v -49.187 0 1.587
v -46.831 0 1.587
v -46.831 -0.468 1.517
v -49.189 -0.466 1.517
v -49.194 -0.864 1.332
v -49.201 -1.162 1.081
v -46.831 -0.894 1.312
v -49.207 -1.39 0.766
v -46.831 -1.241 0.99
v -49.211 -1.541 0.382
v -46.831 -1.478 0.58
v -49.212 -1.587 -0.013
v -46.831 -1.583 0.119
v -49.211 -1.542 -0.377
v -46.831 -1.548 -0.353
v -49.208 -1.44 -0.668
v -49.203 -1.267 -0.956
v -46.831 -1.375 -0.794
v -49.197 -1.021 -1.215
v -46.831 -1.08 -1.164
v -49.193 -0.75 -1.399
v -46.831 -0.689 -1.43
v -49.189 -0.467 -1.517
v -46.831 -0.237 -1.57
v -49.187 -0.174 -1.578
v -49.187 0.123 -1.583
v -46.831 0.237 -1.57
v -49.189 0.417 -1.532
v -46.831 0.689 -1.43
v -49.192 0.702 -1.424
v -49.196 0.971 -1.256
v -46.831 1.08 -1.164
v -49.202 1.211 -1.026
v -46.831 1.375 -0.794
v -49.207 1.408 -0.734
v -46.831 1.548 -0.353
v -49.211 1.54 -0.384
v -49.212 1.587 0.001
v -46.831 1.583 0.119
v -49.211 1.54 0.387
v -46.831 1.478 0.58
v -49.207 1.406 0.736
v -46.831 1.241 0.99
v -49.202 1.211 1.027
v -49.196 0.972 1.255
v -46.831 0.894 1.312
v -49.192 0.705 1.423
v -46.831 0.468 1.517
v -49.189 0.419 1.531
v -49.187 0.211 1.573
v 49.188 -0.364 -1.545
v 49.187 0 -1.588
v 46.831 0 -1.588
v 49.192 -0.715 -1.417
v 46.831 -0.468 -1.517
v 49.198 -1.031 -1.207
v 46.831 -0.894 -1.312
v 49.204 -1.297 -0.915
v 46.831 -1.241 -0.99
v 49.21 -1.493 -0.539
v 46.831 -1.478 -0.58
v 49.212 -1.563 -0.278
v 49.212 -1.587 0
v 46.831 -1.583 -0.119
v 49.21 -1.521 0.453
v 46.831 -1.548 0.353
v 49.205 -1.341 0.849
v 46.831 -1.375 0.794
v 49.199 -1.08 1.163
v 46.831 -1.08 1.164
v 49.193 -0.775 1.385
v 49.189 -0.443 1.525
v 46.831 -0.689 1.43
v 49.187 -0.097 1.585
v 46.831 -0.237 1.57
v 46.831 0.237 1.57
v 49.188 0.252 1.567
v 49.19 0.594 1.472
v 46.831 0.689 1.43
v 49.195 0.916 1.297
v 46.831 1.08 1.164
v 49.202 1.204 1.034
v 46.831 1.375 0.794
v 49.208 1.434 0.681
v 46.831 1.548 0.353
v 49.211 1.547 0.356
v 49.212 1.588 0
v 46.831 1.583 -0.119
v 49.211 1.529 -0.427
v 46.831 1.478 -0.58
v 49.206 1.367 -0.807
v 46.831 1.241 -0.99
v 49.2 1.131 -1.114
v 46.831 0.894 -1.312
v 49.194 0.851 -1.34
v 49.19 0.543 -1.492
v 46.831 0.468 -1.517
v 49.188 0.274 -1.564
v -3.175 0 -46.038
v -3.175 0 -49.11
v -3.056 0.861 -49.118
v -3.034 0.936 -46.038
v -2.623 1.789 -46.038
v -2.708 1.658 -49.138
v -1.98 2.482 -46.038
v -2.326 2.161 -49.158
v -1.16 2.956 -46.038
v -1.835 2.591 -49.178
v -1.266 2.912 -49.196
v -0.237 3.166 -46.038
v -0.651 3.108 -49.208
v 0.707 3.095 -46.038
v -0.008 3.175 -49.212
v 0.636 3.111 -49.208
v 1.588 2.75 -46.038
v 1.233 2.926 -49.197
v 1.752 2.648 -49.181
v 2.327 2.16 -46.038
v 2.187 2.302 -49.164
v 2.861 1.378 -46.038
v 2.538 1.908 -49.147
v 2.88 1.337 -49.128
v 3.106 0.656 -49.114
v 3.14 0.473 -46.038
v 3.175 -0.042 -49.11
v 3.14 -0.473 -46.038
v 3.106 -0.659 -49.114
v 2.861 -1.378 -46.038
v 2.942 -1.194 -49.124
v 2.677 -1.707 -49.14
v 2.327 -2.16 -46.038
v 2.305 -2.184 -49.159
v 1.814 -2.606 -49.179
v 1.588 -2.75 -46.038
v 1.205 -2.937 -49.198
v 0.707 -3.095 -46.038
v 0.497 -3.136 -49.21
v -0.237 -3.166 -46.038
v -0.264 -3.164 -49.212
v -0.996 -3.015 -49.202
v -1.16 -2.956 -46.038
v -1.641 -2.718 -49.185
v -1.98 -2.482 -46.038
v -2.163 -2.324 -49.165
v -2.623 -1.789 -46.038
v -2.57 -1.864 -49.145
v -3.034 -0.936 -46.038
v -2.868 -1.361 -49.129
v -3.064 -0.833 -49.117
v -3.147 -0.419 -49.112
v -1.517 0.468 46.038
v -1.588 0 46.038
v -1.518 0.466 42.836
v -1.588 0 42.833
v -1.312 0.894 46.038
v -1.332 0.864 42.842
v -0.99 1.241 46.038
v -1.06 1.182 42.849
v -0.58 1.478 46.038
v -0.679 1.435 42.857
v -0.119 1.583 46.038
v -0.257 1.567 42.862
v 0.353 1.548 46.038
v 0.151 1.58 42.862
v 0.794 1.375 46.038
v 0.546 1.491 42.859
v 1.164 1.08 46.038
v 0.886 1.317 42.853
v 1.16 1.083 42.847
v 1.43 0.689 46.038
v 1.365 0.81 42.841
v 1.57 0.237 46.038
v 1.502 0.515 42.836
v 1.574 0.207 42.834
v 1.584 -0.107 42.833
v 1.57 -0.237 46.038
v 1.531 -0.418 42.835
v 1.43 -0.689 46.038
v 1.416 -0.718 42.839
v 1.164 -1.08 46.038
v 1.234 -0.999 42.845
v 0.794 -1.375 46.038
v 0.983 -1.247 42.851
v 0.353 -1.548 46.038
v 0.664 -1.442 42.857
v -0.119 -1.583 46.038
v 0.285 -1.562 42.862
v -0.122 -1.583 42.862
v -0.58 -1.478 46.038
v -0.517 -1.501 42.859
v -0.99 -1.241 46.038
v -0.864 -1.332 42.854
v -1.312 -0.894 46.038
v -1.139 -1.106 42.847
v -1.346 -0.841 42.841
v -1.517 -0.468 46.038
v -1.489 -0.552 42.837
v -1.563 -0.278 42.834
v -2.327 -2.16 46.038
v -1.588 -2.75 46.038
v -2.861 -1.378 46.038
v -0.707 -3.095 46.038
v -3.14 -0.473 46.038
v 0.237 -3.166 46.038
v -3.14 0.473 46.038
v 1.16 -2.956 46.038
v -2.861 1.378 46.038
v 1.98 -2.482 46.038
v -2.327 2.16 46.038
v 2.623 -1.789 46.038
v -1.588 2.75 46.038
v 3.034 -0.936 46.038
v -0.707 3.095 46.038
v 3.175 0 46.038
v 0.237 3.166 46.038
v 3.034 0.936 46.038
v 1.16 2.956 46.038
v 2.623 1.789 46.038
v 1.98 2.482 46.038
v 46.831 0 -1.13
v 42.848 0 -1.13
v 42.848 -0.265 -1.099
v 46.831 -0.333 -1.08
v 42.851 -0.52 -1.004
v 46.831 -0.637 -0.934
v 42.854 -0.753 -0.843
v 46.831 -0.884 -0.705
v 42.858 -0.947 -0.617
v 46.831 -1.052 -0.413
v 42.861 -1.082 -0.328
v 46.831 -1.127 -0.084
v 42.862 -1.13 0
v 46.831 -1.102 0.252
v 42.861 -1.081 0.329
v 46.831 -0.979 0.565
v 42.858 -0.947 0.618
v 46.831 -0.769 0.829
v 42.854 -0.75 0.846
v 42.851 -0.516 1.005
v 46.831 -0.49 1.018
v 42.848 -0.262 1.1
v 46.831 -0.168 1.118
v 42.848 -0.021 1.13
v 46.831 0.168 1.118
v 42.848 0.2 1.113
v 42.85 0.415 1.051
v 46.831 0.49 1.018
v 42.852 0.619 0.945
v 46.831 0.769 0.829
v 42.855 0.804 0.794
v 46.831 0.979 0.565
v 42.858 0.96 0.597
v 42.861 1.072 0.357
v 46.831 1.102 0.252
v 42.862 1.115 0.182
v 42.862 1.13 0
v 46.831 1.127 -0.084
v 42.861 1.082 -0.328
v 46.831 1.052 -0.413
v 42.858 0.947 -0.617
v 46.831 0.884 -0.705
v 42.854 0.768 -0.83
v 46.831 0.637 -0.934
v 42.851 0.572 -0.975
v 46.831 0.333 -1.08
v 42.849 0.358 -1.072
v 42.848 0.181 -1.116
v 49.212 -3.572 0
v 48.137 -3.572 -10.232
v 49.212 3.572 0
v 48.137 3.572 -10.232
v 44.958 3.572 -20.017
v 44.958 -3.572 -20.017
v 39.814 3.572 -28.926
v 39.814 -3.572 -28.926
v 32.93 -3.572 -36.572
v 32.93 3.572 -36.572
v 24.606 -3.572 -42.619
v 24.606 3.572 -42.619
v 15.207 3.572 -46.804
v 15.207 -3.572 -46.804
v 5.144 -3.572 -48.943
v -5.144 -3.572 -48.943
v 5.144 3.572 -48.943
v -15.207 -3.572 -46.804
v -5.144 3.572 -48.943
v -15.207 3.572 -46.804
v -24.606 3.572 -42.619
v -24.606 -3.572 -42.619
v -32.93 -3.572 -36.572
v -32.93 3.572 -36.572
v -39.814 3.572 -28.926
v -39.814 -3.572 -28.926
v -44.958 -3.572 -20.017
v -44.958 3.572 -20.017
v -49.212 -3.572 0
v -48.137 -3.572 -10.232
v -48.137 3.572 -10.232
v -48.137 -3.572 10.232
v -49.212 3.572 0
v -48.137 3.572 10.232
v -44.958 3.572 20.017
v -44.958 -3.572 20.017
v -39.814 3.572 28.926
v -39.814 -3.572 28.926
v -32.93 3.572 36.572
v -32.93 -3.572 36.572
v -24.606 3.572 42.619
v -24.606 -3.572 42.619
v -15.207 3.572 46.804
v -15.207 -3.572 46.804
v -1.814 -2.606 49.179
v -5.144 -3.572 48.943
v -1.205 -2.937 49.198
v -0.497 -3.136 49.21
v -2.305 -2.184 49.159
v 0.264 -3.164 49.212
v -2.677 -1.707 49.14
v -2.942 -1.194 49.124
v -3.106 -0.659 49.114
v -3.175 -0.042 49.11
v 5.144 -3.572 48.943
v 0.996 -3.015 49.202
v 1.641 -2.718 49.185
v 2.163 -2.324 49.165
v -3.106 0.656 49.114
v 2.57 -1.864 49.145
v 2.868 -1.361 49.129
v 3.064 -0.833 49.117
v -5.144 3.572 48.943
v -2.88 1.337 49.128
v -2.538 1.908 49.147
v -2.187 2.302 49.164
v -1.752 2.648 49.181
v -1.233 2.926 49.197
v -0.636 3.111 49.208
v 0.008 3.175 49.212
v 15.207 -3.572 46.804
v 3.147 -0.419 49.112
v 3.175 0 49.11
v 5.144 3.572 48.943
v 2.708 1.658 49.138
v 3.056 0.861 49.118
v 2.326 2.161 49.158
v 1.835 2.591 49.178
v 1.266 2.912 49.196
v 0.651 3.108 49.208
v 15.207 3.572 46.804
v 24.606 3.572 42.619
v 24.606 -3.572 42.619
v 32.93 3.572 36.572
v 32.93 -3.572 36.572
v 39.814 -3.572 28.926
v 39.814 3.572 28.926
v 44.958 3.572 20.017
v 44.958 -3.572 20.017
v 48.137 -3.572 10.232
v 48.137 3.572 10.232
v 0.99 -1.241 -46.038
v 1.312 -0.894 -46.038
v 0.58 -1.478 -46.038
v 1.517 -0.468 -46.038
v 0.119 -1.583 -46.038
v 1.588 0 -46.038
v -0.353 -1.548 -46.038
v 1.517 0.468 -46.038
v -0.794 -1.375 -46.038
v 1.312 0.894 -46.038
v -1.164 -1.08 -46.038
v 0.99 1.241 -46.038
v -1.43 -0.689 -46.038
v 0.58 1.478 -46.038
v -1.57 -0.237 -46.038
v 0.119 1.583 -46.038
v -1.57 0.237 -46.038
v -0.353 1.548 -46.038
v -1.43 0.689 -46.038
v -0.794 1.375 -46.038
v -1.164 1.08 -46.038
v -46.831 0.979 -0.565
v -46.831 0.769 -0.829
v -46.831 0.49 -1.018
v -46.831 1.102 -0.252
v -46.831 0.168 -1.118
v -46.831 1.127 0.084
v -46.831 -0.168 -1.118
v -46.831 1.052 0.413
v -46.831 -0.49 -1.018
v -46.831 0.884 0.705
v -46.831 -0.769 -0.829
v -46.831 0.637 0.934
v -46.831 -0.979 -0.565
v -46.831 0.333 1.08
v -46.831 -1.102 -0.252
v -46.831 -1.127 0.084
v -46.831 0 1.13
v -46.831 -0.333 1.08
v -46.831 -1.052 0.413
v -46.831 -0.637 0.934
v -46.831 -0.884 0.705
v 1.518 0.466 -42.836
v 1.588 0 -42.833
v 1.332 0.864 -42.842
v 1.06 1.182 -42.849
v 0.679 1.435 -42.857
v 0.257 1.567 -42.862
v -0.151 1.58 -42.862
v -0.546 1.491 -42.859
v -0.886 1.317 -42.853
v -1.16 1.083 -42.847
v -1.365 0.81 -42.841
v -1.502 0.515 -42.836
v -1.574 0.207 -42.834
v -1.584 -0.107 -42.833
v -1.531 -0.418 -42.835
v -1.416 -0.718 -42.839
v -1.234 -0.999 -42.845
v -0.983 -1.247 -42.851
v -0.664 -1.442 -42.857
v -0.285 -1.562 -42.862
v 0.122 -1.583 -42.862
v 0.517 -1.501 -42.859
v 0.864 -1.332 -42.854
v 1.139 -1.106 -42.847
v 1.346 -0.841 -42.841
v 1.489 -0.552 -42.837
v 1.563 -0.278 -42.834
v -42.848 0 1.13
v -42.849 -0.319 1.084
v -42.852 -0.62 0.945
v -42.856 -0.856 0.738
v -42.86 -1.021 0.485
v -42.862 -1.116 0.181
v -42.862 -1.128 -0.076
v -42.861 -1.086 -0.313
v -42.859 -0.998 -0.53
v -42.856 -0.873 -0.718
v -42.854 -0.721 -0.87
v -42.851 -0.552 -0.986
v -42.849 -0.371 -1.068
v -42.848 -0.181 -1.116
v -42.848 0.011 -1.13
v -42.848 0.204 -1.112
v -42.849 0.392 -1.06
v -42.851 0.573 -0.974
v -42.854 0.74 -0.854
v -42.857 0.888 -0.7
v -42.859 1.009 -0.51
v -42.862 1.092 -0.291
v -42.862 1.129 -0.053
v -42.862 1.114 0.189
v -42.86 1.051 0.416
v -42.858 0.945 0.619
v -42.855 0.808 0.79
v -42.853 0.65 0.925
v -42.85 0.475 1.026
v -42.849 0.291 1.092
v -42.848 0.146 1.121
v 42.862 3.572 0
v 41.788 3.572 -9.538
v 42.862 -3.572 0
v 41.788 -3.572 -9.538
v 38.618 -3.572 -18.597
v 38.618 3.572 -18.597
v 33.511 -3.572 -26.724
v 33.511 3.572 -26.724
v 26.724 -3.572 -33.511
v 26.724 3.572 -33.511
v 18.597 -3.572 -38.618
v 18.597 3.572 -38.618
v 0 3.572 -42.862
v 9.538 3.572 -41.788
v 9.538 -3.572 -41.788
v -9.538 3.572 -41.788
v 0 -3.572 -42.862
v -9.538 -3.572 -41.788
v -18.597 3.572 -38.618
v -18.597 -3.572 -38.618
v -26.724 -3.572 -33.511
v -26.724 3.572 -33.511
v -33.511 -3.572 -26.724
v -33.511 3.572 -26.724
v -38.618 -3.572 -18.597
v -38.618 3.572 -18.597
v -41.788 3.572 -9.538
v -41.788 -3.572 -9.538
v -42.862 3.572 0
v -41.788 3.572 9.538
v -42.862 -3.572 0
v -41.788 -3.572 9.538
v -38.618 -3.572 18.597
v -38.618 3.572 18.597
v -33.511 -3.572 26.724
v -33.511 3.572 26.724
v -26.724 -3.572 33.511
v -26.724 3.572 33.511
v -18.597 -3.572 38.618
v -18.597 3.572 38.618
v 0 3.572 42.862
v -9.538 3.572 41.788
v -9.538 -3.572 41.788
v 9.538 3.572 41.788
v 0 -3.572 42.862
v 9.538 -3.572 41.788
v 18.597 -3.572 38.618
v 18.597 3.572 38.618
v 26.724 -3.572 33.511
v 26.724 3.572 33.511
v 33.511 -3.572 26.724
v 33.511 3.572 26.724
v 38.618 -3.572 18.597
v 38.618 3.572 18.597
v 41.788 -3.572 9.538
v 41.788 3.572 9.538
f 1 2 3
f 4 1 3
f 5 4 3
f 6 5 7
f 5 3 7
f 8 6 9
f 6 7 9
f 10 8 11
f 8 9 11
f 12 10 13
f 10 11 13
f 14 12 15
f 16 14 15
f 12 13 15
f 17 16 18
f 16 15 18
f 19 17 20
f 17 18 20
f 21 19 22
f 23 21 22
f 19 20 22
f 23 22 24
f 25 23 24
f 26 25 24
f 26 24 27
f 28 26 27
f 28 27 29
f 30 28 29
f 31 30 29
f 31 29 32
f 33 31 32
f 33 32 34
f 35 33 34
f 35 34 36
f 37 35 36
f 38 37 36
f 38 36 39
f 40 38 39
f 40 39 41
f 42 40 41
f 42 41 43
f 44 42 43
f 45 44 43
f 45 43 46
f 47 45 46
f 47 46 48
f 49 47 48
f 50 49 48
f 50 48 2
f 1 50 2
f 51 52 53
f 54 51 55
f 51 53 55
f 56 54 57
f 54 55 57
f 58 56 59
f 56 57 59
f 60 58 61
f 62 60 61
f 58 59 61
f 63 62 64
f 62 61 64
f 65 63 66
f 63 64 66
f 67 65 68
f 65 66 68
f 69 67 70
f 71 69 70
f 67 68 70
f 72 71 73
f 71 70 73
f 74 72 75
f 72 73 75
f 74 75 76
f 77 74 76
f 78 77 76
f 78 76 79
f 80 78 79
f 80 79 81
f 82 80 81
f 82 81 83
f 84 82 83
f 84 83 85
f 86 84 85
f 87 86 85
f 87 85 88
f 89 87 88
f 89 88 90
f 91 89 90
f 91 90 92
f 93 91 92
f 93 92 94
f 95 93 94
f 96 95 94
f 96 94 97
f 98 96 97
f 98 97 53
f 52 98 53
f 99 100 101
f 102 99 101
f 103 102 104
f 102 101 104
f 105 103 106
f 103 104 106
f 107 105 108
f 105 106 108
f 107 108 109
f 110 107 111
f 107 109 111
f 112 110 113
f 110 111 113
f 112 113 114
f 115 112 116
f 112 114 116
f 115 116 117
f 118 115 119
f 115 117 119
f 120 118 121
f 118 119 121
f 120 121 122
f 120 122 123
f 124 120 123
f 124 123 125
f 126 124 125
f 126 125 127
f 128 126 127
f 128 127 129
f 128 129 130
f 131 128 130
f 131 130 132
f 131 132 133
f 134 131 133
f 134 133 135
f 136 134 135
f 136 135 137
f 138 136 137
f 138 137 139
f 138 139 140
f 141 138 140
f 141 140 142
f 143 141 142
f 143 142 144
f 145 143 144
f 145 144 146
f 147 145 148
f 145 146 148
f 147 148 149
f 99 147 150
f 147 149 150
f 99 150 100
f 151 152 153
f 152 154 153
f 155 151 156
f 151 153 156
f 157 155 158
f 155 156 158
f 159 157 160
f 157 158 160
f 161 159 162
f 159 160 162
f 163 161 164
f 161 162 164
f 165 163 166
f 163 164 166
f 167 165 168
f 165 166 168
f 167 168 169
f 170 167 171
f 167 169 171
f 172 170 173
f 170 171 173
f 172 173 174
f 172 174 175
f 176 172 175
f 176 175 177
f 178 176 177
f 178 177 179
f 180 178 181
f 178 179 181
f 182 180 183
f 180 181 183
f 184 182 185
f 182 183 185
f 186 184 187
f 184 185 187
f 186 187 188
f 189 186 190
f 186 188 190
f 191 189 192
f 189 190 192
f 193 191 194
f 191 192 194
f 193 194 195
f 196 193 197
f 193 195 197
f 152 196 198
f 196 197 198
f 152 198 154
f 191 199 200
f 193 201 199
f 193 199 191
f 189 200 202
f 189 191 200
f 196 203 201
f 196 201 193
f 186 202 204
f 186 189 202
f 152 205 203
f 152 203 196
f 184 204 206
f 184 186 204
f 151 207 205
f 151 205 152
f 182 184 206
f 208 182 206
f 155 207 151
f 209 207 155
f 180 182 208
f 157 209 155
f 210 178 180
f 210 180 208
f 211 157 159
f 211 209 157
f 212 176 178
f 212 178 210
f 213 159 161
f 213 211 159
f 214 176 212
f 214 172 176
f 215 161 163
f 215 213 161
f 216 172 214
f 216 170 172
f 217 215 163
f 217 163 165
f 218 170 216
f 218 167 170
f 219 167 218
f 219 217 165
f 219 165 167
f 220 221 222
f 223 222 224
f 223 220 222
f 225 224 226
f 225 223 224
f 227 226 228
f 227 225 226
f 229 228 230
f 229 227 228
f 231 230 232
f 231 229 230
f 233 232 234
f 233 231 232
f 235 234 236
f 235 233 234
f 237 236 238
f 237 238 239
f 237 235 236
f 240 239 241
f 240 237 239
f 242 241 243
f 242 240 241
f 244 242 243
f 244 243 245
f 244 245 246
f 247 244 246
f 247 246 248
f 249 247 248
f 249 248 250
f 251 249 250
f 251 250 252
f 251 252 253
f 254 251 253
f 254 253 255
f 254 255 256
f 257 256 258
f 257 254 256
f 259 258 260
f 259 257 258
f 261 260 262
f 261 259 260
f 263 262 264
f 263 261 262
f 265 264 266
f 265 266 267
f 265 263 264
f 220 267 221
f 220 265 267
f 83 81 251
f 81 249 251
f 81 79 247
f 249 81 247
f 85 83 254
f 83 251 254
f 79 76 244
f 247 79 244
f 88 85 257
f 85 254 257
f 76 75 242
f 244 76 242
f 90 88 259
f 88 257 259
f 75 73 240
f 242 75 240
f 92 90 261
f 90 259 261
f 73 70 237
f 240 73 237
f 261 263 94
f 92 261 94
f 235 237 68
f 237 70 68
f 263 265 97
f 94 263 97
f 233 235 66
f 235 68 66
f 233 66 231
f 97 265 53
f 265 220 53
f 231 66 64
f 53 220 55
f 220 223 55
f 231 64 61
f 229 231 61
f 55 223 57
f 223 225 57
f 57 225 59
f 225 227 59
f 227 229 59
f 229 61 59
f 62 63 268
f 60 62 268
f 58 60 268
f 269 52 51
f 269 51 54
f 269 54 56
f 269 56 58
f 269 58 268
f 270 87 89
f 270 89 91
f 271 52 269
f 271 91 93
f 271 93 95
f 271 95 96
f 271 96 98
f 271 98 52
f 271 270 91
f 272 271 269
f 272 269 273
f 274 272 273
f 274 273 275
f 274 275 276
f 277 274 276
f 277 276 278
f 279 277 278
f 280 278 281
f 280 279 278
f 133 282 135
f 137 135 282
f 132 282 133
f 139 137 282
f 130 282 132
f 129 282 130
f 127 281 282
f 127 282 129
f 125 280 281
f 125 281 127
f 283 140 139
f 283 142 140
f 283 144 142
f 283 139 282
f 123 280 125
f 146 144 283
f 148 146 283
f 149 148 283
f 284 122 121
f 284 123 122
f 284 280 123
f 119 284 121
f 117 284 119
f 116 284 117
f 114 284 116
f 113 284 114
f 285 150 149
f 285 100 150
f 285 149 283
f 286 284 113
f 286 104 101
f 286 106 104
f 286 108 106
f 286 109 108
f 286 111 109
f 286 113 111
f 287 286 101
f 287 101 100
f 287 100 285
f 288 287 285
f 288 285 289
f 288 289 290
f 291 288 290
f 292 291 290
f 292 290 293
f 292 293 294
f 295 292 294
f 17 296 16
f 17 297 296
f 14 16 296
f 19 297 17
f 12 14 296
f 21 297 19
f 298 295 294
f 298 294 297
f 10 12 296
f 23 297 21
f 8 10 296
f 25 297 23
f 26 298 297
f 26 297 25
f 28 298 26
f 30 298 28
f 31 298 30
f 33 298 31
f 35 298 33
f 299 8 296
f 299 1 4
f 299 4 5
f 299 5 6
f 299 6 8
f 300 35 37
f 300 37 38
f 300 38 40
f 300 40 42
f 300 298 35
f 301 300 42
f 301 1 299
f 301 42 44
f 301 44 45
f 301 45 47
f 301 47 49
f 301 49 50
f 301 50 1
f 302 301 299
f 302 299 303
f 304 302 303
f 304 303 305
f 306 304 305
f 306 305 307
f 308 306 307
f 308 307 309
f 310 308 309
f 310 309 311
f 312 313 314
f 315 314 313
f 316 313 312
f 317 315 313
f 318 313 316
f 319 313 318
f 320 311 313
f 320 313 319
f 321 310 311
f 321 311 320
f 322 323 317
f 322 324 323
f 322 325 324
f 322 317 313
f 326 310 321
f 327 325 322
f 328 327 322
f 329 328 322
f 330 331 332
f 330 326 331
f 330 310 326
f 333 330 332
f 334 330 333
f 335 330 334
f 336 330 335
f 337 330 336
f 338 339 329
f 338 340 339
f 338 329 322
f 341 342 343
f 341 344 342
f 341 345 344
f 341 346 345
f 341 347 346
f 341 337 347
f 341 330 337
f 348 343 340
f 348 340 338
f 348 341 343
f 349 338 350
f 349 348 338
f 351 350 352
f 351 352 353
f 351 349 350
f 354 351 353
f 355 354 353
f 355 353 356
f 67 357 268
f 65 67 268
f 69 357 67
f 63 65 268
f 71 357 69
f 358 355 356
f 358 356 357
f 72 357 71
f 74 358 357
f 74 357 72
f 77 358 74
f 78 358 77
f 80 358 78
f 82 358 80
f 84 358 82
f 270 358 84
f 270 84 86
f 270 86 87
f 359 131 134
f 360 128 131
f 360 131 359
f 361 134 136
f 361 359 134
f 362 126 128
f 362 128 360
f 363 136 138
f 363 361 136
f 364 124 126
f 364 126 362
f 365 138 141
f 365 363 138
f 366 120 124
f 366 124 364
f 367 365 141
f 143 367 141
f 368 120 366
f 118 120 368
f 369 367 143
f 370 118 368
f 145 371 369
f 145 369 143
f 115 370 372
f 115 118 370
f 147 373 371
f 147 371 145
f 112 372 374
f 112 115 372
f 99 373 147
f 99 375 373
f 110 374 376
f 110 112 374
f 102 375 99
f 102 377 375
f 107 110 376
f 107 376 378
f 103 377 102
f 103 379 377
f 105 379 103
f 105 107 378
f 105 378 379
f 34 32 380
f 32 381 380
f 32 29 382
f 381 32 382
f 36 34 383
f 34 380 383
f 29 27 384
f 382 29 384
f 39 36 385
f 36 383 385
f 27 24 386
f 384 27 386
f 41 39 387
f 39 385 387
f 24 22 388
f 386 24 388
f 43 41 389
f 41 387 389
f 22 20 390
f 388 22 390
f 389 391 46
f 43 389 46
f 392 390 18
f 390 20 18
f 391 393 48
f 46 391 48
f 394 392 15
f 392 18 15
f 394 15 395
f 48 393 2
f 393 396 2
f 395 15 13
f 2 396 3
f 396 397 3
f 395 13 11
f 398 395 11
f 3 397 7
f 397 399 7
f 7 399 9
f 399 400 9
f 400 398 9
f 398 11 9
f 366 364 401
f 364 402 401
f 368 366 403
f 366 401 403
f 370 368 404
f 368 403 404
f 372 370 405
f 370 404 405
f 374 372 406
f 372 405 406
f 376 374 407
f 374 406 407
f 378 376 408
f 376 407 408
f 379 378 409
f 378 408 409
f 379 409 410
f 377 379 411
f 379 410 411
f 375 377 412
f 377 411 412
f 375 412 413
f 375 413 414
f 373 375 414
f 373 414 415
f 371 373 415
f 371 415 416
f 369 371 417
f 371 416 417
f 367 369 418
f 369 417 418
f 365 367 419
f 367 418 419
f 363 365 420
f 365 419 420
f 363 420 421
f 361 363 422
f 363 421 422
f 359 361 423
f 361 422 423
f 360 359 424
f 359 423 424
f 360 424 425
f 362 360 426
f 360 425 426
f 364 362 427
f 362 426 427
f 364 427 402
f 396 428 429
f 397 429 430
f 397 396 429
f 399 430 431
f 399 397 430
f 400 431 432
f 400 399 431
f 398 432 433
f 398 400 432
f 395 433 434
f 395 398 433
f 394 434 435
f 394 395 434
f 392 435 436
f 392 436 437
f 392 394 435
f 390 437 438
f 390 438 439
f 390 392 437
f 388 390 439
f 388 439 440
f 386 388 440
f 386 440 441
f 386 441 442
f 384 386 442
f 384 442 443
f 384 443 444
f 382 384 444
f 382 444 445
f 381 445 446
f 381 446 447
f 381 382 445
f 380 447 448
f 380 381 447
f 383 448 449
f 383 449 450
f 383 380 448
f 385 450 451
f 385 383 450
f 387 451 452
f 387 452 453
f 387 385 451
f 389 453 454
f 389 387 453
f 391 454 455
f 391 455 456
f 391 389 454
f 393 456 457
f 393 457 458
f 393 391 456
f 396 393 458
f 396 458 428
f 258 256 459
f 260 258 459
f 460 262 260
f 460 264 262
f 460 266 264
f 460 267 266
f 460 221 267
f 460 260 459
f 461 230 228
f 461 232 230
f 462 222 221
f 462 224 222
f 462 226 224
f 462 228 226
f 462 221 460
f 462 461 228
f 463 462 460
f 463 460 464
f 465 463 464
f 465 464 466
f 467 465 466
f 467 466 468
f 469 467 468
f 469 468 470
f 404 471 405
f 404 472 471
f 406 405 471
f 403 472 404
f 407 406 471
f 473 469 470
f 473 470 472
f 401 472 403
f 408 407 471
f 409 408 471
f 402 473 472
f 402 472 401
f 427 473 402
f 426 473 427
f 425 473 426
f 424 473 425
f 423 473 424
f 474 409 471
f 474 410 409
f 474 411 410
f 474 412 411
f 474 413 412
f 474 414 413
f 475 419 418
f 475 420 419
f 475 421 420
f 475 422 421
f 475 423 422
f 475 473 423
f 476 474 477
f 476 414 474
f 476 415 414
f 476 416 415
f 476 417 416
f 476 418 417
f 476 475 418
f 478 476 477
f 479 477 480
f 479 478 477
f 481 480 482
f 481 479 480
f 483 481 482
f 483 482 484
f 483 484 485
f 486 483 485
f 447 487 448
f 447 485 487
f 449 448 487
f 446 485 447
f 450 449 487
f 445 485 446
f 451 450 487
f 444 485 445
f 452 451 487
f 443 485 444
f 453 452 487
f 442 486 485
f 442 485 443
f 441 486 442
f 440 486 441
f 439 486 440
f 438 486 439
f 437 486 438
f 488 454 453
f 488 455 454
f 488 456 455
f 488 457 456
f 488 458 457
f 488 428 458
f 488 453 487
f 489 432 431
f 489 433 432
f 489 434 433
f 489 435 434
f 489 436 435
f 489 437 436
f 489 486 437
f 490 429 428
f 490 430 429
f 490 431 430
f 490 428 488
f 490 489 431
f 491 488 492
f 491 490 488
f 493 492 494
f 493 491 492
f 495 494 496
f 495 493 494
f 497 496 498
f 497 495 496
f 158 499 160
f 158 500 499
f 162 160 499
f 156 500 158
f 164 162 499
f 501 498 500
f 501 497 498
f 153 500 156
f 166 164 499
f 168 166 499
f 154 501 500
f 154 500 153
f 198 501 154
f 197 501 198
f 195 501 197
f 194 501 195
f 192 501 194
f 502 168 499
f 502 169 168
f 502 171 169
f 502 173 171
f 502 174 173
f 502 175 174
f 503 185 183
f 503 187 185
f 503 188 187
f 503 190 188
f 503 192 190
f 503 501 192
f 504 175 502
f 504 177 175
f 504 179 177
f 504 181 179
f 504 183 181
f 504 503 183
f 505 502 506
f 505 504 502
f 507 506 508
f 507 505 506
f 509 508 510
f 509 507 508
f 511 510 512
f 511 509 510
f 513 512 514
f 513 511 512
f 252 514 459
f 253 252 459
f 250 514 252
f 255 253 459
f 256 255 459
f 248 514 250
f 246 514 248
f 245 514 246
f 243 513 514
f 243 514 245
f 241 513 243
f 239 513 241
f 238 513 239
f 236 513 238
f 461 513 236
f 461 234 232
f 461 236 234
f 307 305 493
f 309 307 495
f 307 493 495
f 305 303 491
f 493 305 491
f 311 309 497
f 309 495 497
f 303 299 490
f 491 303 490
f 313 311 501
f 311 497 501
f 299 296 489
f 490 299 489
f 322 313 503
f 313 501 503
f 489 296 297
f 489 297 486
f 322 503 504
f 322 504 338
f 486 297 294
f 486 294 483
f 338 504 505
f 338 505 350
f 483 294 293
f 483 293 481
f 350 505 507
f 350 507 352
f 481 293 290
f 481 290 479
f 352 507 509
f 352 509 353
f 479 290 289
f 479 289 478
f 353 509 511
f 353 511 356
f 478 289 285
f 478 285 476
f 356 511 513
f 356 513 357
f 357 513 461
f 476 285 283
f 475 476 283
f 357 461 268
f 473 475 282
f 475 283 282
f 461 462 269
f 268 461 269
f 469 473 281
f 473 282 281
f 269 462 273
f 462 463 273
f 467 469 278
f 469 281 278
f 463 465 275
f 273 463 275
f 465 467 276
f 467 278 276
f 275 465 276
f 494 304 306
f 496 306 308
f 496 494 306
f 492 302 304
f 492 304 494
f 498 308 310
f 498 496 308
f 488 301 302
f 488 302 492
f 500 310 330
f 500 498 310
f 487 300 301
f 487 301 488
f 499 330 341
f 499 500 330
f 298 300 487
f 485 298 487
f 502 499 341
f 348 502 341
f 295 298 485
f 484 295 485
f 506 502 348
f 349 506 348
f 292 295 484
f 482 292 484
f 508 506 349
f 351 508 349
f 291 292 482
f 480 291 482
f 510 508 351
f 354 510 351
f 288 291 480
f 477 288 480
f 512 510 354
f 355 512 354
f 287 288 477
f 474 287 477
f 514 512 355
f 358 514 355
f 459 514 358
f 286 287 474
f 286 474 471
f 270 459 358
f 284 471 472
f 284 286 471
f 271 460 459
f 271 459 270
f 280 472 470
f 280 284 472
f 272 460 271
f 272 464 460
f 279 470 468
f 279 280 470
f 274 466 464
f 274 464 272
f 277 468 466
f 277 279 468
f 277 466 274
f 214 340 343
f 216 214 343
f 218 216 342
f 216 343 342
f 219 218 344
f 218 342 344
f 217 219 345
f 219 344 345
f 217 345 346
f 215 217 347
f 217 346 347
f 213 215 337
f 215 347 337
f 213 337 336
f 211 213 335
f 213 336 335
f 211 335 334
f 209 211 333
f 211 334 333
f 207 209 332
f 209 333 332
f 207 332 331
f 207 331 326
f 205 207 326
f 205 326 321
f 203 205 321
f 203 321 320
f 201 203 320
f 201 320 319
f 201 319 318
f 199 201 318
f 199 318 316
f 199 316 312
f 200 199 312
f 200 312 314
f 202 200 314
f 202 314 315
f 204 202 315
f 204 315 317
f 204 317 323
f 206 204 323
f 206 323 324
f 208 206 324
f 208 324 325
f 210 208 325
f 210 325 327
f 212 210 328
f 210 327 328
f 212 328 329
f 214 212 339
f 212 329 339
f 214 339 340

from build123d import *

# Parameters (mm, degrees)
SKETCH1_R           = 49.2125
SKETCH1_R_2         = 42.8625
BOSS_EXTRUDE1_DEPTH = 3.571875
HOLE2_D             = 3.175
HOLE2_DEPTH         = 2.38125
HOLE1_D             = 3.175
HOLE1_DEPTH         = 12.7
HOLE1_CBORE_D       = 6.35
HOLE1_CBORE_DEPTH   = 3.175
CIRPATTERN1_COUNT   = 2


with BuildPart() as part:
    # Sketch1 → Boss-Extrude1 (new body, symmetric)
    with BuildSketch(Plane(origin=(0, 0, 0), x_dir=(1, 0, 0), z_dir=(0, 1, 0))):
        Circle(SKETCH1_R)
        Circle(SKETCH1_R_2, mode=Mode.SUBTRACT)
    extrude(amount=BOSS_EXTRUDE1_DEPTH, both=True)

    # Hole2
    with Locations(Plane(origin=(49.2125, 0, 0), x_dir=(0, 0, 1), z_dir=(1, 0, 0))):
        with Locations((0, 0)):
            hole2 = Hole(HOLE2_D / 2, depth=HOLE2_DEPTH)

    # Sketch7 → #4-40 Tapped Hole1 (revolve, cut)
    with BuildSketch(Plane(origin=(46.83125, 0, 0), x_dir=(0, 0, -1), z_dir=(0, 1, 0))):
        Polygon((0, 0), (0, 9.569152758), (1.1303, 8.89), (1.1303, 0), align=None)
    f_4_40_tapped_hole1 = revolve(axis=Axis((53.18125, 0, 0), (-1, 0, 0)), mode=Mode.SUBTRACT)

    # Hole1
    with Locations(Plane(origin=(0, 0, -49.2125), x_dir=(-1, 0, 0), z_dir=(0, 0, -1))):
        with Locations((0, 0)):
            hole1 = CounterBoreHole(HOLE1_D / 2, HOLE1_CBORE_D / 2, HOLE1_CBORE_DEPTH, depth=HOLE1_DEPTH)

    # CirPattern1: Hole2, #4-40 Tapped Hole1, Hole1 ×2 about axis
    cirpattern1_axis = Axis((0, 0, 0), (0, 1, 0))
    for i in range(1, CIRPATTERN1_COUNT):
        add(hole2.rotate(cirpattern1_axis, i * 360 / CIRPATTERN1_COUNT), mode=Mode.SUBTRACT)
        add(f_4_40_tapped_hole1.rotate(cirpattern1_axis, i * 360 / CIRPATTERN1_COUNT), mode=Mode.SUBTRACT)
        add(hole1.rotate(cirpattern1_axis, i * 360 / CIRPATTERN1_COUNT), mode=Mode.SUBTRACT)


solid = part.part
